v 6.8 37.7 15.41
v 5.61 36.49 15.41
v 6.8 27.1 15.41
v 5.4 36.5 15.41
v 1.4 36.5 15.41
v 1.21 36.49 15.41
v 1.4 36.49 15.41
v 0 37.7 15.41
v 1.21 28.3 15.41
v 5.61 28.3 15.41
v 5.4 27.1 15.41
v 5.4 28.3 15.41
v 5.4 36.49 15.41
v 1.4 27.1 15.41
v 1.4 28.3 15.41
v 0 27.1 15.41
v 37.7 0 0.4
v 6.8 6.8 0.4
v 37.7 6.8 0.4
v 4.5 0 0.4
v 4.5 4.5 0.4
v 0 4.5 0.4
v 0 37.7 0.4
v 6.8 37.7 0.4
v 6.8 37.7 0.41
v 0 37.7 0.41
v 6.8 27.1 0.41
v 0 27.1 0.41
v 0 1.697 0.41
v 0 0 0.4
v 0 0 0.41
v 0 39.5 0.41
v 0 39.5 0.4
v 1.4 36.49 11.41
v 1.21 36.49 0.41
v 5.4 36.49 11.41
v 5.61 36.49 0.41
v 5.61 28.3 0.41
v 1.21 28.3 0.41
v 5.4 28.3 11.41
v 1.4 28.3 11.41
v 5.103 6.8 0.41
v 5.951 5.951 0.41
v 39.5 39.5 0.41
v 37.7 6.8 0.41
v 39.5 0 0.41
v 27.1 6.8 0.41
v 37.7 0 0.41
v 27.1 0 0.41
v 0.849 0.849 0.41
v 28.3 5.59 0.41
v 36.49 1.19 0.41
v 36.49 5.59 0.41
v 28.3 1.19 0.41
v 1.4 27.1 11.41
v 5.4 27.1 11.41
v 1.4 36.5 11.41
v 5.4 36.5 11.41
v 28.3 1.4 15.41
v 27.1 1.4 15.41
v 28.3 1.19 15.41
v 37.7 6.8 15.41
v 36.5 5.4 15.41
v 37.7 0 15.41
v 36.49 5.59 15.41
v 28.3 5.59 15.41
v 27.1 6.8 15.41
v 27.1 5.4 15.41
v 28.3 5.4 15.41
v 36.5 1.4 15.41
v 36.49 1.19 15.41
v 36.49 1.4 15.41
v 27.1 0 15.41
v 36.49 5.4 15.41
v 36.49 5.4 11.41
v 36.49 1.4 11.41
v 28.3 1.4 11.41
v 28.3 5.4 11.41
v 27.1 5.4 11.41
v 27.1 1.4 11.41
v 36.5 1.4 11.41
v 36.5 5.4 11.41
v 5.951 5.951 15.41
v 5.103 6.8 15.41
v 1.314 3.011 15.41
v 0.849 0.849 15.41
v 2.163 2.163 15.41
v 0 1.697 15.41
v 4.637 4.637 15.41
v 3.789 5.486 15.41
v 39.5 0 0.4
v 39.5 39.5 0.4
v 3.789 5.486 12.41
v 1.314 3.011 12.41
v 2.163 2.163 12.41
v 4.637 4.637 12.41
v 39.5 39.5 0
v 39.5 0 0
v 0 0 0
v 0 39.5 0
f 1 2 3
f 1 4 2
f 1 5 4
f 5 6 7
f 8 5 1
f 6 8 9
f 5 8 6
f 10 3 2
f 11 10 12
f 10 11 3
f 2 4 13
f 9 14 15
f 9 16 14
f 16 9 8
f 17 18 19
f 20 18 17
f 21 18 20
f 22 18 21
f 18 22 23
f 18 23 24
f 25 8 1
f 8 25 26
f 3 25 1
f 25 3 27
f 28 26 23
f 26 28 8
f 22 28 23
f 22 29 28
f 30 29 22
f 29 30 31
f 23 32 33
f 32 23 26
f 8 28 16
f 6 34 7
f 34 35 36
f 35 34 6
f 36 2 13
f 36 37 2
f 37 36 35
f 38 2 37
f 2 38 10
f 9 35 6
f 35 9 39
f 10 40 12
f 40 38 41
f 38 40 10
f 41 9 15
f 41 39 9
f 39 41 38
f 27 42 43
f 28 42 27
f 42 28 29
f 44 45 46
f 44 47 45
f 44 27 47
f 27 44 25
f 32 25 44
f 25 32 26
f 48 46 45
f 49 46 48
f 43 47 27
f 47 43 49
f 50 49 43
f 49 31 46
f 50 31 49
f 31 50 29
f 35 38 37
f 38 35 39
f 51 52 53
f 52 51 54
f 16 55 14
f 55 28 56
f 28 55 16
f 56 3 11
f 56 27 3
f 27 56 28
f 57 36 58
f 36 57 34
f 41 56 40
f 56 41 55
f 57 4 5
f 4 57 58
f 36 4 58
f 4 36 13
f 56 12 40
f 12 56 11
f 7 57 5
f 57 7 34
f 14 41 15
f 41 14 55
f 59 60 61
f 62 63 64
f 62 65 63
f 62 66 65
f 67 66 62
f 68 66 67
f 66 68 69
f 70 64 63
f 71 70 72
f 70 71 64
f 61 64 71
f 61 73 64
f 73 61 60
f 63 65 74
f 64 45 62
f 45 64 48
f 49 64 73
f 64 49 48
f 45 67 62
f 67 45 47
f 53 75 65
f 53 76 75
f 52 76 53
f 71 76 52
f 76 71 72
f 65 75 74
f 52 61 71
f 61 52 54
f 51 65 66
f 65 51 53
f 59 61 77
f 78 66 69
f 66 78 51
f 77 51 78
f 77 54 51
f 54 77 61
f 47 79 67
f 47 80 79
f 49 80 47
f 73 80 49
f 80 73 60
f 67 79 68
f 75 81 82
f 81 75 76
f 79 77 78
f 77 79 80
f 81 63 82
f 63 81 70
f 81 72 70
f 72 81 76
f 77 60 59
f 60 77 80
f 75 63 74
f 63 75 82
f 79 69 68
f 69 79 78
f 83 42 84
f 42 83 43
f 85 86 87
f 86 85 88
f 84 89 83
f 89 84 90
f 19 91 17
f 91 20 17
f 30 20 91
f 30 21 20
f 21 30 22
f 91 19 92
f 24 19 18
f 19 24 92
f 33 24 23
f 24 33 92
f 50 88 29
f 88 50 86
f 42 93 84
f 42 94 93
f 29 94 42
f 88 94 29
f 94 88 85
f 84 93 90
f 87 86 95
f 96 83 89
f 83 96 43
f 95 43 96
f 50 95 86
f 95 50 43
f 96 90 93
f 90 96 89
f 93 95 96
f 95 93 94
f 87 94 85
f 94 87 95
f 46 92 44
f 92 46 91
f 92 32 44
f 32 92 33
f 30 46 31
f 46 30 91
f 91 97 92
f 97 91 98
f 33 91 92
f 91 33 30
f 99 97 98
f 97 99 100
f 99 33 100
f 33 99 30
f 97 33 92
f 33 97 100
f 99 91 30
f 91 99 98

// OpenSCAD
// file: ../../Base/Boxes.scad
// Fischertechnik Box Foundation
// Pre-designed Boxes

use <Constants.scad>

include <PlacementOptions.scad>

box190Width = 190;
box190Depth = 130;
box130Width = 130;
box130Depth = 95;

// Values are from an original ec3 box
topBottomDifference = 1.5;
outerHeight = 40;
innerHeight = 38.2;
baseThickness = outerHeight - innerHeight;
stackExcess = 5.7;
radius = 3.5;
wallThickness = 1.5;
tolerance = 0.2;
stackOffset = innerHeight - stackExcess;

boxUsageHeight = stackOffset;
boxWallThickness = wallThickness;
boxBaseThickness = baseThickness;
boxWebWidth = 3.0;

// getBoxWallThickness()
// Gets the wall thickness of a Fischertechnik Box
function getBoxWallThickness() = boxWallThickness;

// getBoxUsageHeight()
// Gets the usable height of a Fischertechnik box
function getBoxUsageHeight() = boxUsageHeight;

// getBoxInnerHeight()
// Gets the inner height of a Fischertechnik box, including the stack excess
function getBoxInnerHeight() = innerHeight;

// getBoxBaseThickness()
// Gets the thickness of the Fischertechnik box base.
function getBoxBaseThickness() = boxBaseThickness;

// getBoxWebWidth()
// Gets the width of a box web
function getBoxWebWidth() = boxWebWidth;

// getBox190Space()
// Gets the usable inner space of a Box 190 as an x/y-list
function getBox190Space() = [
    box190Width - 2*getBoxWallThickness() - topBottomDifference, 
    box190Depth - 2*getBoxWallThickness() - topBottomDifference ];

// BoxBase(width, depth)
// Creates an empty stackable Fischertechnik compatible box
// width = Outer width of the box (190, 130, ...)
// depth = Outer depth of the box (130, 95, ...)

module BoxBase(width, depth, height=outerHeight) {    
    thinPlate = 0.01;

    innerHeight = height - baseThickness;    
    
    module BodyPlate(width, depth) {
        translate([radius, radius])
        hull() {
            w = width-2*radius;
            d = depth-2*radius;
            cube([w, d, thinPlate]);
            cylinder(thinPlate, r=radius, $fn=getFragments());
            translate([w, 0])
                cylinder(thinPlate, r=radius, $fn=getFragments());
            translate([w, d])
                cylinder(thinPlate, r=radius, $fn=getFragments());
            translate([0, d])
                cylinder(thinPlate, r=radius, $fn=getFragments());
        }
    }
    
    module Body(tolerance=tolerance) {
        hull() {
            // Bottom with tolerance to fit into the original boxes when stacked
            translate([-wallThickness+tolerance, -wallThickness+tolerance, -baseThickness])
                BodyPlate(width-topBottomDifference-2*tolerance, depth-topBottomDifference-2*tolerance);
            
            // Top
            translate([-wallThickness-topBottomDifference/2, -wallThickness-topBottomDifference/2, innerHeight-thinPlate])
                BodyPlate(width, depth);
         }
    }

    module Cutoff() {
        hull() {
            coWidth = width - 2*wallThickness;
            coDepth = depth - 2*wallThickness;
            
            // Bottom
            BodyPlate(coWidth-topBottomDifference, coDepth-topBottomDifference);

            // Top
            translate([-topBottomDifference/2, -topBottomDifference/2, innerHeight+thinPlate]) 
                BodyPlate(coWidth, coDepth);
        }
    }
    
    difference() {        
        Body();
        Cutoff();
        stackOffset = innerHeight - stackExcess;
        translate([0, 0, stackOffset + baseThickness])
            Body(tolerance=0);
    }
}

// Creates the Fischertechnik empty box 130x190 mm and places it at position 0,0
// 190x130 are the outer sizes, the inner space is slightly smaller. Use getBox190Space() to get the inner sizes.
// The box is positioned that the usable inner space is at the 0,0,0 position. The

module Box190() {
    BoxBase(box190Width, box190Depth);
}

// Gets the usable inner space of a Box 130 as an x/y-list
function getBox130Space() = [
    box130Width - 2*getBoxWallThickness() - topBottomDifference, 
    box130Depth - 2*getBoxWallThickness() - topBottomDifference ];

// Creates the Fischertechnik empty box 95x130 mm and places it at position 0,0
// 190x130 are the outer sizes, the inner space is slightly smaller. Use getBox190Space() to get the inner sizes.
// The box is positioned that the usable inner space is at the 0,0,0 position. The

module Box130() {
    BoxBase(box130Width, box130Depth);
}

// Creates a web at the specified box walls
// corner 0 = LowerLeft, 1 = UpperLeft, 2 = UpperRight, 3 = LowerRight
// side 0 = LeftOfCorner, 1 = RightOfCorner
// distance = Distance in mm from the corner
// boxSpace = inner width and depth of the box (default: Box 190)
// webWidth = length of the web (default is 3 mms)
// webThickness = thickness of the web (default is 1 mm)

module BoxWeb(corner, side, distance, boxSpace=getBox190Space(), webWidth=getBoxWebWidth(), webThickness=1.0) {
    sink = getBoxWallThickness()/2;

    width = (corner % 2 == 0) ? 
            (side == LeftOfCorner ? webWidth : webThickness) :
            (side == LeftOfCorner ? webThickness : webWidth);

    depth = (corner % 2 == 0) ? 
            (side == RightOfCorner ? webWidth : webThickness) :
            (side == RightOfCorner ? webThickness : webWidth);
    
    xDiff = corner == LowerLeft ? 
                (side == LeftOfCorner ? -sink : distance) :
            (corner == UpperLeft ?                
                (side == LeftOfCorner ? distance : -sink) :
            (corner == UpperRight ?
                (side == LeftOfCorner ? boxSpace.x-webWidth+sink : boxSpace.x-distance-webThickness) :
                (side == LeftOfCorner ? boxSpace.x-distance-webThickness: boxSpace.x-webWidth+sink)));

    yDiff = corner == LowerLeft ? 
                (side == RightOfCorner ? -sink : distance) :
            (corner == UpperLeft ?
                (side == RightOfCorner ? boxSpace.y-distance : boxSpace.y-webWidth+sink) :
            (corner == UpperRight ?
                (side == RightOfCorner ? boxSpace.y-webWidth+sink : boxSpace.y-distance) :
                (side == RightOfCorner ? distance : -sink)));
    
    translate([xDiff, yDiff, -getExcess()])
        cube([width, depth, boxUsageHeight + 2*getExcess()]);
}
// file: ../../Base/Alignment.scad
// Fischertechnik Box Foundation
// Geometry Helpers Alignment

include <PlacementOptions.scad>

// getAlignedX(elementWidth, spaceWidth, align=AlignRight, offset=0)
// Gets the aligned X offset of an element with the given
// width in the given space.
// elementWidth = The width of the element to positon
// spaceWidth = The space where the element should be aligned
// align = 0 AlignLeft, 1 AlignCenter, 2 AlignRight
// offset = an optional offset from the aligned position. When
// aligned left or centered, then positive values are in X direction.
// When aligned right then positive values are in negative X direction.

function getAlignedX(elementWidth, spaceWidth, align=AlignRight, offset=0) =
    (align == AlignLeft) ?
        offset :
        ((align == AlignCenter) ?
        (spaceWidth - elementWidth)/2 + offset :
        spaceWidth - offset - elementWidth);

// getAlignedY(elementDepth, spaceDepth, align=AlignTop, offset=0)
// Gets the aligned Y offset of an element with the given
// depth in the given space.
// elementDepth = The depth of the element to positon
// spaceDepth = The space where the element should be aligned
// align = 0 AlignBottom, 1 AlignCenter, 2 AlignTop
// offset = an optional offset from the aligned position. When
// aligned bottom or centered, then positive values are in Y direction.
// When aligned top then positive values are in negative Y direction.

function getAlignedY(elementDepth, spaceDepth, align=AlignTop, offset=0) =
    (align == AlignBottom) ?
        offset :
        ((align == AlignCenter) ?
        (spaceDepth - elementDepth)/2 + offset :
        spaceDepth - offset - elementDepth);
// file: ../../Base/PlacementOptions.scad
// Fischertechnik Box Foundation
// Placement Options

// Alignment
NoAlign = 0;
AlignLeft = 1;
AlignBottom = 2;
AlignCenter = 3;
AlignRight = 4;
AlignTop = 5;

// Element rotation degree steps
rotations = [0, -90, -180, -270];

// Rotation
NoRotation = 0;
Rotate0 = 0;
Rotate90 = 1;
Rotate180 = 2;
Rotate270 = 3;

// Docking (seen from above)
NoDock = -1;
DockLeft = 0;
DockTop = 1;
DockRight = 2;
DockCorner = 2;
DockBottom = 3;

// Web corners
LowerLeft = 0;
UpperLeft = 1;
UpperRight = 2;
LowerRight = 3;

// Web position relative to corner
LeftOfCorner = 0;
RightOfCorner = 1;
// file: ../../Base/Rotation.scad
// Fischertechnik Box Foundation
// Geometry Helpers Rotation

include <PlacementOptions.scad>

// getRotatedSpace(space, rotation=NoRotation)
// Rotates the space dependent on the specified rotation

function getRotatedSpace(space, rotation=NoRotation) = [
    (rotation == Rotate90 || rotation == Rotate270) ? space.y : space.x,
    (rotation == Rotate90 || rotation == Rotate270) ? space.x : space.y
];

// Rotates the given space around the fixed left lower corner
// space = the space the children needs as width/depth list [width,depth]
// rotation = 0 Rotate0 degrees, 1 Rotate90 degrees, 2 Rotate180 degrees, 3 Rotate270 degrees (equivalent to -90)

module RotateFix(space, rotation=NoRotation) {
    dy = (rotation == Rotate0 || rotation == Rotate270) ? 0 :
        (rotation == Rotate90) ? space.x :
        space.y;
    dx = (rotation < Rotate180) ? 0 :
        (rotation == Rotate180) ? space.x :
        space.y;
    
    translate([dx, dy, 0])
        rotate([0, 0, rotations[rotation]])
            children();
}
// file: ../../Base/Placement.scad
// Fischertechnik Box Foundation
// Geometry Helpers Placement

use <Constants.scad>
use <Alignment.scad>
use <Rotation.scad>
use <Boxes.scad>

include <PlacementOptions.scad>

// Place(x=0, y=0, elementSpace=[0,0], alignX=AlignLeft, alignY=AlignBottom, rotation=Rotate0, boxSpace=getBox190Space())
// Places the child at the specified position
// y = Y-Position. This is a relative position when an X aligment is specified.
// x = X-Position. This is a relative position when an Y aligment is specified.
// elementSpace = space of the element to be placed [x,y]
// alignX = -1=NoAlign, 0 AlignLeft, 1 AlignCenter, 3 AlignRight (elementSpace and boxSpace required!)
// alignY = -1=NoAlign, 2 AlignBottom, 1 AlignCenter, 4 AlignTop (elementSpace and boxSpace required!)
// rotation = 0 Rotate0 0 degrees, 1 Rotate90 90 degrees, 
// 2 Rotate180 180 degrees, 3 Rotate270 270 degrees (equivalent to -90)
// boxSpace = Inner space of the box where the placement occurs [x,y] - default is Box 190x130 inner space

module Place(x=0, y=0, elementSpace=[0,0], 
  alignX=AlignLeft, alignY=AlignBottom, 
  rotation=NoRotation, boxSpace=getBox190Space()) {

    module Position(x, y, space, rotation=Rotate0) {
        translate([x, y, 0])
            RotateFix(space, rotation)
                children();
    }

    space = getRotatedSpace(elementSpace, rotation);
    alignedX = getAlignedX(space.x, boxSpace.x, alignX, x);
    alignedY = getAlignedY(space.y, boxSpace.y, alignY, y);
    Position(alignedX, alignedY, elementSpace, rotation)
        children();
}

// Center(space=getBox130Space(), elementSpace=[0,0])
// space = Space where the children is centered. For cylinder use centered=true and no elementSpace.
// elementSpace = space of the element to be centered [x,y]

module Center(space=getBox190Space(), elementSpace=[0,0]) {
    Place(elementSpace=elementSpace, boxSpace=space, alignX=AlignCenter, alignY=AlignCenter)
        children();
}

// CenterHorizontal(width=0, y=0, offset=0, space=getBox130Space())
// width = Width of the element to be placed.
// y = Y position of the element
// offset = Offset from the center position (negative will be left of the center)
// space = Space where the element is placed

module CenterHorizontal(width=0, y=0, offset=0, space=getBox190Space()) {
    Place(x=offset, y=y, elementSpace=[width, 0], boxSpace=space, alignX=AlignCenter)
        children(0);
}

// CenterVertical(depth=0, x=0, offset=0, space=getBox130Space())
// depth = Depth of the element to be placed.
// x = X position of the element
// offset = Offset from the center position (negative will be down of the center)
// space = Space where the element is placed

module CenterVertical(depth=0, x=0, offset=0, space=getBox190Space()) {
    Place(x=x, y=offset, elementSpace=[0, depth], boxSpace=space, alignY=AlignCenter)
        children(0);
}

// getIsVertical(align)
// True if the specified alignment needs a vertical orientation for a divider (AlignRight, AlignLeft)

function getIsVertical(align) = (align == AlignRight || align == AlignLeft);

// getIsHorizontal(align)
// True if the specified alignment needs a horizontal orientation for a divider (AlignTop, AlignBottom)

function getIsHorizontal(align) = (align == AlignTop || align == AlignBottom);
// file: ../../Elements/AxisClip10.scad
// Fischertechnik Box Library
// Axis for clip 10
// 31023

use <../ModelBase/Simple.scad>
use <../Base/Constants.scad>

width = 12;
depth = 12;
height = 23;
upperDiameter = 3.6;
clipHeight = 10;

// getAxisClip10Space()
// Gets the space of a frame for a clip 10 with spring ring (mot2)

function getAxisClip10Space() = [width, depth, height];

// AxisClip10(height, clipHeight)
// Axis for clip 10 with spring ring (mot2)
// height = Height of the complete axis
// clipHeight = Height of the rt for the clip (standard is 10, in mot3 its only 7)

module AxisClip10(height=height, clipHeight=clipHeight) {
    LeveledAxisWithSpace(height, height-clipHeight, getAxisClip10Space(), diameter=upperDiameter);
}

// Tests
color("lightgray")
AxisClip10();
// file: ../../Base/Constants.scad
// Fischertechnik Box Foundation
// Constants

// Constant values necessary for multiple elements

// Base constants
dividerThickness = 1.2;
excess = 0.01;
fragments = 90;
tolerance = 0.8;

// Gets the thickness of a divider 
function getDividerThickness() = dividerThickness;

// Gets the excess that is used to merge walls into each other
function getExcess() = excess;

// Gets amount of fragments of a cylinder
function getFragments() = fragments;

// Gets the inner tolerance of a frame to each side
function getTolerance() = tolerance;


// Fischertechnik specific constants
axisDiameter = 4;
axisBottomDiameter = axisDiameter + 1;
standardEdgeDistance = 2.5;
standardWebDistance = 11.5;
standardCornerLength = 15;
tubeWallFactor = 0.8;
smallPartsFrameHeight = 20;

// Gets axis diameter
function getAxisDiameter() = axisDiameter;

// Gets axis bottom diameter for thicker part at the bottom
function getAxisBottomDiameter() = axisBottomDiameter;

// gets the standard distance to the wall of the box for dockable frames with webs
function getStandardEdgeDistance() = standardEdgeDistance;

// gets the standard distance of each web to the corner of the dockable frame
function getStandardWebDistance() = standardWebDistance;

// gets the standard length of the corner walls of a dockable frame
function getStandardCornerLength() = standardCornerLength;

// gets the wall thickness of a tube.
function getTubeWallThickness() = tubeWallFactor * getDividerThickness();

// gets the frame height for docked small parts boxes.
function getSmallPartsFrameHeight() = smallPartsFrameHeight;
// file: ../../Elements/FrameAngleAxis.scad
// Fischertechnik Box Library
// Frame for Angle Axis
// 31035

use <../Base/Constants.scad>
use <../Base/Placement.scad>
use <../Base/Rotation.scad>
use <../ModelBase/Simple.scad>
use <../ModelBase/Complex.scad>

include <../Base/PlacementOptions.scad>

width = 34.5;
depth = 34.5;
extra = 1.8;
difference = getFrameAxisSpace().y + extra;

// getFrameAngleAxisSpace(count=1)
// Gets the space for frame and holders for multiple angle axis
// count = Count of angle axis

function getFrameAngleAxisSpace(count=1) = getFrameOuterVolume([
    width + extra + (count-1)*difference, 
    depth + extra + (count-1)*difference, 
    getFrameAxisHeight()]);

// FrameAngleAxis(count=1)
// Frame and holders for multiple angle axis
// count = Count of angle axis

module FrameAngleAxis(count=1) {
    Space(getFrameAngleAxisSpace(count));
    
    module Holders() {
        RotateFix(getFrameAngleAxisSpace(), Rotate90) {
            Place(x=extra)
                FrameAxis(single=true);
            
            spaceWithoutExtra = getFrameOuterVolume([
                width,
                depth,
                getFrameAxisHeight()
            ]);

            Place(
                elementSpace=[spaceWithoutExtra.x, getFrameAxisSpace().y], 
                boxSpace = getFrameAngleAxisSpace(),
                alignX = AlignRight,
                rotation = Rotate90)
                FrameAxis(single=true);
        }
    }
    
    module Web() {
        baseLength = getFrameAxisSpace().y + (count - 1) * difference;
        webLength = sqrt(baseLength^2 + baseLength^2);
        
        webVolume = [webLength - 2*getDividerThickness(), getDividerThickness(), getFrameAxisHeight()];
        
        rotate([0,0,45]) {
            difference() {
                translate([getDividerThickness(), 0])
                    Wall(webVolume);
        
                webDifference = sqrt(difference^2 + difference^2);
                singleLength = sqrt(getFrameAxisSpace().y^2 + getFrameAxisSpace().y^2);
                webCutoffHeight = 3.0;
                webCutoffWidth = 3.5;
                cutoffVolume = [webCutoffWidth, getDividerThickness()*2, webCutoffHeight + getExcess()];
                for (xWebCutoffOffset = [0:webDifference:webLength])
                    translate([
                        (singleLength - cutoffVolume.x)/2 + xWebCutoffOffset, 
                        -getDividerThickness()/2, 
                        webVolume.z - webCutoffHeight])
                        cube(cutoffVolume);
            }
        }
    }

    for (i = [0:count-1])
        translate([difference*i, difference*i])
            Holders();
        
    Web();
}

// Test
color("lightgray")
FrameAngleAxis();
// file: ../TestPrint.scad
// 3D Print Test Base

use <../Base/Constants.scad>

use <../Elements/AxisClip10.scad>

module TestPrint(elementSpace) {
    cube([elementSpace.x, elementSpace.y, 0.4]);
    translate([0,0,0.4+getExcess()]) {
        children();
    }
}

TestPrint(getAxisClip10Space())
    AxisClip10();
// main file
// 3D Print Test
// FrameAngleAxis

use <../TestPrint.scad>
use <../../Elements/FrameAngleAxis.scad>

TestPrint(getFrameAngleAxisSpace())
    FrameAngleAxis();
